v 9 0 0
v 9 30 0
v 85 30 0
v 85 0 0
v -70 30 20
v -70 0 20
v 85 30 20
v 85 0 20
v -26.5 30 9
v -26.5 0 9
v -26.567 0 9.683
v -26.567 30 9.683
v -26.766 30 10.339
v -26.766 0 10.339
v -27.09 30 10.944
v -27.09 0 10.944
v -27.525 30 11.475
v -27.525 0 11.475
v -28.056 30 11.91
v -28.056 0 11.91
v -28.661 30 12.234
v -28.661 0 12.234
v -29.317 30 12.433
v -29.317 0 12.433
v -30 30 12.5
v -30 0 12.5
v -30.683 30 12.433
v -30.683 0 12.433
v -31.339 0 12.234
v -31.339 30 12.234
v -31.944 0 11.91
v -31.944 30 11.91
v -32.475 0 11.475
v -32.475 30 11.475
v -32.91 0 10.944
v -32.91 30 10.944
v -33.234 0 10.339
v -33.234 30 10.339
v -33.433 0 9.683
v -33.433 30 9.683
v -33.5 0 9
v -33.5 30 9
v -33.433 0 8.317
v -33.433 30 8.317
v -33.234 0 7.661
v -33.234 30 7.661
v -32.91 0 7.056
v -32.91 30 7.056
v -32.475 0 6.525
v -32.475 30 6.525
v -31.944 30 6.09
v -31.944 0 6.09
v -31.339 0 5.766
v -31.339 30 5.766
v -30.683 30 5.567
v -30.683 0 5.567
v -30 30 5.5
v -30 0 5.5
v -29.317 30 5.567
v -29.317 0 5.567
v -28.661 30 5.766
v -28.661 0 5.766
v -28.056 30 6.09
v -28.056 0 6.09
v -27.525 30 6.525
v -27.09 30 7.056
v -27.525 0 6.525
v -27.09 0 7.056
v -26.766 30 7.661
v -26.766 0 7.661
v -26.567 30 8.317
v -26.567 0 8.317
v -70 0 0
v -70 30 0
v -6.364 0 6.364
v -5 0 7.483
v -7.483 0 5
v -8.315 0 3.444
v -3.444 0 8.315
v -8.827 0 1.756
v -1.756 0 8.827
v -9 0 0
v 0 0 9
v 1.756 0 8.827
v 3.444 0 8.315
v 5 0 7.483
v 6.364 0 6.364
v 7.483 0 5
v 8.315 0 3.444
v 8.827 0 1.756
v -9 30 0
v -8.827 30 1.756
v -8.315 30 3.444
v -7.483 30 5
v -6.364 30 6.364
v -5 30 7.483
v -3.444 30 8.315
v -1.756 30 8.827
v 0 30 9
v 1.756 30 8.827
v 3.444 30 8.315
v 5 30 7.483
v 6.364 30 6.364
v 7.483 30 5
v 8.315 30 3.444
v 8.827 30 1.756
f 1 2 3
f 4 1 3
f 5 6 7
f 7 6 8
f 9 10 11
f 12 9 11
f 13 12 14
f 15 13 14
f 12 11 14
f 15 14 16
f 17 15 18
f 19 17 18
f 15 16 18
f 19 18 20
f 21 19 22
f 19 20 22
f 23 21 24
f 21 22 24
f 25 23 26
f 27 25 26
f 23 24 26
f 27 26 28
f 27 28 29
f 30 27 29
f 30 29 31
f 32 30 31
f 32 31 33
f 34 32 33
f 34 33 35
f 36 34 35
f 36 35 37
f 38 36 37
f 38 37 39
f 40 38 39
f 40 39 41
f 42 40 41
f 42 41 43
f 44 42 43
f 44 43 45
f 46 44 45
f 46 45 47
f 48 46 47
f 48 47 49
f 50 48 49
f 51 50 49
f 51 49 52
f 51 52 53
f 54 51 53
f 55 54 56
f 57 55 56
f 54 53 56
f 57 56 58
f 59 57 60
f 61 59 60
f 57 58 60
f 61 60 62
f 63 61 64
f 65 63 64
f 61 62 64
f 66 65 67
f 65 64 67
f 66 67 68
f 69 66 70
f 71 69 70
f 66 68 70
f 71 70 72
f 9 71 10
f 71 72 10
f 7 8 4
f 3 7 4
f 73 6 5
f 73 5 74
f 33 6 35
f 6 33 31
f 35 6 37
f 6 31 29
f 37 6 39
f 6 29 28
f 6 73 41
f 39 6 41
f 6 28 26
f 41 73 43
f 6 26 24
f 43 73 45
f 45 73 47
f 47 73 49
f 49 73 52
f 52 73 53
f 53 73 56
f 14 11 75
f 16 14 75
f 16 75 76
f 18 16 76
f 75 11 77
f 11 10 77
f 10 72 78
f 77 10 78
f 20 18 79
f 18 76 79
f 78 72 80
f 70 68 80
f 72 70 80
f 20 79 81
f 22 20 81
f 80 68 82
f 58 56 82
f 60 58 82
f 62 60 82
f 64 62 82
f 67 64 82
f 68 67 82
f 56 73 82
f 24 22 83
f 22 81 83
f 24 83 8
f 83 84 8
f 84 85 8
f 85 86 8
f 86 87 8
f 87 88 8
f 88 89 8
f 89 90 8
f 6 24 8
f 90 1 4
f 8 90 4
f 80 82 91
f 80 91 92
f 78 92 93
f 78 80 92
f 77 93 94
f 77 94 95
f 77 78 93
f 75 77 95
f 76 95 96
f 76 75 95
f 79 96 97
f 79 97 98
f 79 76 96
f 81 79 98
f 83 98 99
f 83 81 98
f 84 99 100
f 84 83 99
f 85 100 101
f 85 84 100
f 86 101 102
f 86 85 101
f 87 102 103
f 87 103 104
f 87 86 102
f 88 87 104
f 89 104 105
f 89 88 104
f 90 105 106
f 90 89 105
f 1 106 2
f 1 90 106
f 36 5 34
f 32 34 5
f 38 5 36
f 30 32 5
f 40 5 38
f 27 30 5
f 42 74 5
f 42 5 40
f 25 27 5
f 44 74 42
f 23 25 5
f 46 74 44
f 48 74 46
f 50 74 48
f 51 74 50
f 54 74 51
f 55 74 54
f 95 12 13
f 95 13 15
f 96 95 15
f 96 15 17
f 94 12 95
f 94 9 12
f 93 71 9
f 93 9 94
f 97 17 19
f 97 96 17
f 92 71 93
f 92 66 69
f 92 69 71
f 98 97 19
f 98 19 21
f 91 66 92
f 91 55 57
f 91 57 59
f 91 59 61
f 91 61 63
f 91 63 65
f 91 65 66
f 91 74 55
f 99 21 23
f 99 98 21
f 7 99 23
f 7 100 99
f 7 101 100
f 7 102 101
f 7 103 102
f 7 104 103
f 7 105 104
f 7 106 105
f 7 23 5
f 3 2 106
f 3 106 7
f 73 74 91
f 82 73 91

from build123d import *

# Parameters (mm, degrees)
SKETCH1_W           = 155
SKETCH1_H           = 40
SKETCH1_R           = 9
BOSS_EXTRUDE1_DEPTH = 30
SKETCH2_W           = 155
SKETCH2_H           = 30
CUT_EXTRUDE1_DEPTH  = 21
SKETCH4_R           = 3.5
CUT_EXTRUDE3_DEPTH  = 31


with BuildPart() as part:
    # Sketch1 → Boss-Extrude1 (new body)
    with BuildSketch(Plane(origin=(0, 0, 0), x_dir=(1, 0, 0), z_dir=(0, 1, 0))):
        with Locations((7.5, 0)):
            Rectangle(SKETCH1_W, SKETCH1_H)
        Circle(SKETCH1_R, mode=Mode.SUBTRACT)
    extrude(amount=BOSS_EXTRUDE1_DEPTH)

    # Sketch2 → Cut-Extrude1 (cut, through all)
    with BuildSketch(Plane.XY):
        with Locations((7.5, 15)):
            Rectangle(SKETCH2_W, SKETCH2_H)
    extrude(amount=-CUT_EXTRUDE1_DEPTH, mode=Mode.SUBTRACT)

    # Sketch4 → Cut-Extrude3 (cut, through all)
    with BuildSketch(Plane.XZ):
        with Locations((-30, 9)):
            Circle(SKETCH4_R)
    extrude(amount=-CUT_EXTRUDE3_DEPTH, mode=Mode.SUBTRACT)


solid = part.part
